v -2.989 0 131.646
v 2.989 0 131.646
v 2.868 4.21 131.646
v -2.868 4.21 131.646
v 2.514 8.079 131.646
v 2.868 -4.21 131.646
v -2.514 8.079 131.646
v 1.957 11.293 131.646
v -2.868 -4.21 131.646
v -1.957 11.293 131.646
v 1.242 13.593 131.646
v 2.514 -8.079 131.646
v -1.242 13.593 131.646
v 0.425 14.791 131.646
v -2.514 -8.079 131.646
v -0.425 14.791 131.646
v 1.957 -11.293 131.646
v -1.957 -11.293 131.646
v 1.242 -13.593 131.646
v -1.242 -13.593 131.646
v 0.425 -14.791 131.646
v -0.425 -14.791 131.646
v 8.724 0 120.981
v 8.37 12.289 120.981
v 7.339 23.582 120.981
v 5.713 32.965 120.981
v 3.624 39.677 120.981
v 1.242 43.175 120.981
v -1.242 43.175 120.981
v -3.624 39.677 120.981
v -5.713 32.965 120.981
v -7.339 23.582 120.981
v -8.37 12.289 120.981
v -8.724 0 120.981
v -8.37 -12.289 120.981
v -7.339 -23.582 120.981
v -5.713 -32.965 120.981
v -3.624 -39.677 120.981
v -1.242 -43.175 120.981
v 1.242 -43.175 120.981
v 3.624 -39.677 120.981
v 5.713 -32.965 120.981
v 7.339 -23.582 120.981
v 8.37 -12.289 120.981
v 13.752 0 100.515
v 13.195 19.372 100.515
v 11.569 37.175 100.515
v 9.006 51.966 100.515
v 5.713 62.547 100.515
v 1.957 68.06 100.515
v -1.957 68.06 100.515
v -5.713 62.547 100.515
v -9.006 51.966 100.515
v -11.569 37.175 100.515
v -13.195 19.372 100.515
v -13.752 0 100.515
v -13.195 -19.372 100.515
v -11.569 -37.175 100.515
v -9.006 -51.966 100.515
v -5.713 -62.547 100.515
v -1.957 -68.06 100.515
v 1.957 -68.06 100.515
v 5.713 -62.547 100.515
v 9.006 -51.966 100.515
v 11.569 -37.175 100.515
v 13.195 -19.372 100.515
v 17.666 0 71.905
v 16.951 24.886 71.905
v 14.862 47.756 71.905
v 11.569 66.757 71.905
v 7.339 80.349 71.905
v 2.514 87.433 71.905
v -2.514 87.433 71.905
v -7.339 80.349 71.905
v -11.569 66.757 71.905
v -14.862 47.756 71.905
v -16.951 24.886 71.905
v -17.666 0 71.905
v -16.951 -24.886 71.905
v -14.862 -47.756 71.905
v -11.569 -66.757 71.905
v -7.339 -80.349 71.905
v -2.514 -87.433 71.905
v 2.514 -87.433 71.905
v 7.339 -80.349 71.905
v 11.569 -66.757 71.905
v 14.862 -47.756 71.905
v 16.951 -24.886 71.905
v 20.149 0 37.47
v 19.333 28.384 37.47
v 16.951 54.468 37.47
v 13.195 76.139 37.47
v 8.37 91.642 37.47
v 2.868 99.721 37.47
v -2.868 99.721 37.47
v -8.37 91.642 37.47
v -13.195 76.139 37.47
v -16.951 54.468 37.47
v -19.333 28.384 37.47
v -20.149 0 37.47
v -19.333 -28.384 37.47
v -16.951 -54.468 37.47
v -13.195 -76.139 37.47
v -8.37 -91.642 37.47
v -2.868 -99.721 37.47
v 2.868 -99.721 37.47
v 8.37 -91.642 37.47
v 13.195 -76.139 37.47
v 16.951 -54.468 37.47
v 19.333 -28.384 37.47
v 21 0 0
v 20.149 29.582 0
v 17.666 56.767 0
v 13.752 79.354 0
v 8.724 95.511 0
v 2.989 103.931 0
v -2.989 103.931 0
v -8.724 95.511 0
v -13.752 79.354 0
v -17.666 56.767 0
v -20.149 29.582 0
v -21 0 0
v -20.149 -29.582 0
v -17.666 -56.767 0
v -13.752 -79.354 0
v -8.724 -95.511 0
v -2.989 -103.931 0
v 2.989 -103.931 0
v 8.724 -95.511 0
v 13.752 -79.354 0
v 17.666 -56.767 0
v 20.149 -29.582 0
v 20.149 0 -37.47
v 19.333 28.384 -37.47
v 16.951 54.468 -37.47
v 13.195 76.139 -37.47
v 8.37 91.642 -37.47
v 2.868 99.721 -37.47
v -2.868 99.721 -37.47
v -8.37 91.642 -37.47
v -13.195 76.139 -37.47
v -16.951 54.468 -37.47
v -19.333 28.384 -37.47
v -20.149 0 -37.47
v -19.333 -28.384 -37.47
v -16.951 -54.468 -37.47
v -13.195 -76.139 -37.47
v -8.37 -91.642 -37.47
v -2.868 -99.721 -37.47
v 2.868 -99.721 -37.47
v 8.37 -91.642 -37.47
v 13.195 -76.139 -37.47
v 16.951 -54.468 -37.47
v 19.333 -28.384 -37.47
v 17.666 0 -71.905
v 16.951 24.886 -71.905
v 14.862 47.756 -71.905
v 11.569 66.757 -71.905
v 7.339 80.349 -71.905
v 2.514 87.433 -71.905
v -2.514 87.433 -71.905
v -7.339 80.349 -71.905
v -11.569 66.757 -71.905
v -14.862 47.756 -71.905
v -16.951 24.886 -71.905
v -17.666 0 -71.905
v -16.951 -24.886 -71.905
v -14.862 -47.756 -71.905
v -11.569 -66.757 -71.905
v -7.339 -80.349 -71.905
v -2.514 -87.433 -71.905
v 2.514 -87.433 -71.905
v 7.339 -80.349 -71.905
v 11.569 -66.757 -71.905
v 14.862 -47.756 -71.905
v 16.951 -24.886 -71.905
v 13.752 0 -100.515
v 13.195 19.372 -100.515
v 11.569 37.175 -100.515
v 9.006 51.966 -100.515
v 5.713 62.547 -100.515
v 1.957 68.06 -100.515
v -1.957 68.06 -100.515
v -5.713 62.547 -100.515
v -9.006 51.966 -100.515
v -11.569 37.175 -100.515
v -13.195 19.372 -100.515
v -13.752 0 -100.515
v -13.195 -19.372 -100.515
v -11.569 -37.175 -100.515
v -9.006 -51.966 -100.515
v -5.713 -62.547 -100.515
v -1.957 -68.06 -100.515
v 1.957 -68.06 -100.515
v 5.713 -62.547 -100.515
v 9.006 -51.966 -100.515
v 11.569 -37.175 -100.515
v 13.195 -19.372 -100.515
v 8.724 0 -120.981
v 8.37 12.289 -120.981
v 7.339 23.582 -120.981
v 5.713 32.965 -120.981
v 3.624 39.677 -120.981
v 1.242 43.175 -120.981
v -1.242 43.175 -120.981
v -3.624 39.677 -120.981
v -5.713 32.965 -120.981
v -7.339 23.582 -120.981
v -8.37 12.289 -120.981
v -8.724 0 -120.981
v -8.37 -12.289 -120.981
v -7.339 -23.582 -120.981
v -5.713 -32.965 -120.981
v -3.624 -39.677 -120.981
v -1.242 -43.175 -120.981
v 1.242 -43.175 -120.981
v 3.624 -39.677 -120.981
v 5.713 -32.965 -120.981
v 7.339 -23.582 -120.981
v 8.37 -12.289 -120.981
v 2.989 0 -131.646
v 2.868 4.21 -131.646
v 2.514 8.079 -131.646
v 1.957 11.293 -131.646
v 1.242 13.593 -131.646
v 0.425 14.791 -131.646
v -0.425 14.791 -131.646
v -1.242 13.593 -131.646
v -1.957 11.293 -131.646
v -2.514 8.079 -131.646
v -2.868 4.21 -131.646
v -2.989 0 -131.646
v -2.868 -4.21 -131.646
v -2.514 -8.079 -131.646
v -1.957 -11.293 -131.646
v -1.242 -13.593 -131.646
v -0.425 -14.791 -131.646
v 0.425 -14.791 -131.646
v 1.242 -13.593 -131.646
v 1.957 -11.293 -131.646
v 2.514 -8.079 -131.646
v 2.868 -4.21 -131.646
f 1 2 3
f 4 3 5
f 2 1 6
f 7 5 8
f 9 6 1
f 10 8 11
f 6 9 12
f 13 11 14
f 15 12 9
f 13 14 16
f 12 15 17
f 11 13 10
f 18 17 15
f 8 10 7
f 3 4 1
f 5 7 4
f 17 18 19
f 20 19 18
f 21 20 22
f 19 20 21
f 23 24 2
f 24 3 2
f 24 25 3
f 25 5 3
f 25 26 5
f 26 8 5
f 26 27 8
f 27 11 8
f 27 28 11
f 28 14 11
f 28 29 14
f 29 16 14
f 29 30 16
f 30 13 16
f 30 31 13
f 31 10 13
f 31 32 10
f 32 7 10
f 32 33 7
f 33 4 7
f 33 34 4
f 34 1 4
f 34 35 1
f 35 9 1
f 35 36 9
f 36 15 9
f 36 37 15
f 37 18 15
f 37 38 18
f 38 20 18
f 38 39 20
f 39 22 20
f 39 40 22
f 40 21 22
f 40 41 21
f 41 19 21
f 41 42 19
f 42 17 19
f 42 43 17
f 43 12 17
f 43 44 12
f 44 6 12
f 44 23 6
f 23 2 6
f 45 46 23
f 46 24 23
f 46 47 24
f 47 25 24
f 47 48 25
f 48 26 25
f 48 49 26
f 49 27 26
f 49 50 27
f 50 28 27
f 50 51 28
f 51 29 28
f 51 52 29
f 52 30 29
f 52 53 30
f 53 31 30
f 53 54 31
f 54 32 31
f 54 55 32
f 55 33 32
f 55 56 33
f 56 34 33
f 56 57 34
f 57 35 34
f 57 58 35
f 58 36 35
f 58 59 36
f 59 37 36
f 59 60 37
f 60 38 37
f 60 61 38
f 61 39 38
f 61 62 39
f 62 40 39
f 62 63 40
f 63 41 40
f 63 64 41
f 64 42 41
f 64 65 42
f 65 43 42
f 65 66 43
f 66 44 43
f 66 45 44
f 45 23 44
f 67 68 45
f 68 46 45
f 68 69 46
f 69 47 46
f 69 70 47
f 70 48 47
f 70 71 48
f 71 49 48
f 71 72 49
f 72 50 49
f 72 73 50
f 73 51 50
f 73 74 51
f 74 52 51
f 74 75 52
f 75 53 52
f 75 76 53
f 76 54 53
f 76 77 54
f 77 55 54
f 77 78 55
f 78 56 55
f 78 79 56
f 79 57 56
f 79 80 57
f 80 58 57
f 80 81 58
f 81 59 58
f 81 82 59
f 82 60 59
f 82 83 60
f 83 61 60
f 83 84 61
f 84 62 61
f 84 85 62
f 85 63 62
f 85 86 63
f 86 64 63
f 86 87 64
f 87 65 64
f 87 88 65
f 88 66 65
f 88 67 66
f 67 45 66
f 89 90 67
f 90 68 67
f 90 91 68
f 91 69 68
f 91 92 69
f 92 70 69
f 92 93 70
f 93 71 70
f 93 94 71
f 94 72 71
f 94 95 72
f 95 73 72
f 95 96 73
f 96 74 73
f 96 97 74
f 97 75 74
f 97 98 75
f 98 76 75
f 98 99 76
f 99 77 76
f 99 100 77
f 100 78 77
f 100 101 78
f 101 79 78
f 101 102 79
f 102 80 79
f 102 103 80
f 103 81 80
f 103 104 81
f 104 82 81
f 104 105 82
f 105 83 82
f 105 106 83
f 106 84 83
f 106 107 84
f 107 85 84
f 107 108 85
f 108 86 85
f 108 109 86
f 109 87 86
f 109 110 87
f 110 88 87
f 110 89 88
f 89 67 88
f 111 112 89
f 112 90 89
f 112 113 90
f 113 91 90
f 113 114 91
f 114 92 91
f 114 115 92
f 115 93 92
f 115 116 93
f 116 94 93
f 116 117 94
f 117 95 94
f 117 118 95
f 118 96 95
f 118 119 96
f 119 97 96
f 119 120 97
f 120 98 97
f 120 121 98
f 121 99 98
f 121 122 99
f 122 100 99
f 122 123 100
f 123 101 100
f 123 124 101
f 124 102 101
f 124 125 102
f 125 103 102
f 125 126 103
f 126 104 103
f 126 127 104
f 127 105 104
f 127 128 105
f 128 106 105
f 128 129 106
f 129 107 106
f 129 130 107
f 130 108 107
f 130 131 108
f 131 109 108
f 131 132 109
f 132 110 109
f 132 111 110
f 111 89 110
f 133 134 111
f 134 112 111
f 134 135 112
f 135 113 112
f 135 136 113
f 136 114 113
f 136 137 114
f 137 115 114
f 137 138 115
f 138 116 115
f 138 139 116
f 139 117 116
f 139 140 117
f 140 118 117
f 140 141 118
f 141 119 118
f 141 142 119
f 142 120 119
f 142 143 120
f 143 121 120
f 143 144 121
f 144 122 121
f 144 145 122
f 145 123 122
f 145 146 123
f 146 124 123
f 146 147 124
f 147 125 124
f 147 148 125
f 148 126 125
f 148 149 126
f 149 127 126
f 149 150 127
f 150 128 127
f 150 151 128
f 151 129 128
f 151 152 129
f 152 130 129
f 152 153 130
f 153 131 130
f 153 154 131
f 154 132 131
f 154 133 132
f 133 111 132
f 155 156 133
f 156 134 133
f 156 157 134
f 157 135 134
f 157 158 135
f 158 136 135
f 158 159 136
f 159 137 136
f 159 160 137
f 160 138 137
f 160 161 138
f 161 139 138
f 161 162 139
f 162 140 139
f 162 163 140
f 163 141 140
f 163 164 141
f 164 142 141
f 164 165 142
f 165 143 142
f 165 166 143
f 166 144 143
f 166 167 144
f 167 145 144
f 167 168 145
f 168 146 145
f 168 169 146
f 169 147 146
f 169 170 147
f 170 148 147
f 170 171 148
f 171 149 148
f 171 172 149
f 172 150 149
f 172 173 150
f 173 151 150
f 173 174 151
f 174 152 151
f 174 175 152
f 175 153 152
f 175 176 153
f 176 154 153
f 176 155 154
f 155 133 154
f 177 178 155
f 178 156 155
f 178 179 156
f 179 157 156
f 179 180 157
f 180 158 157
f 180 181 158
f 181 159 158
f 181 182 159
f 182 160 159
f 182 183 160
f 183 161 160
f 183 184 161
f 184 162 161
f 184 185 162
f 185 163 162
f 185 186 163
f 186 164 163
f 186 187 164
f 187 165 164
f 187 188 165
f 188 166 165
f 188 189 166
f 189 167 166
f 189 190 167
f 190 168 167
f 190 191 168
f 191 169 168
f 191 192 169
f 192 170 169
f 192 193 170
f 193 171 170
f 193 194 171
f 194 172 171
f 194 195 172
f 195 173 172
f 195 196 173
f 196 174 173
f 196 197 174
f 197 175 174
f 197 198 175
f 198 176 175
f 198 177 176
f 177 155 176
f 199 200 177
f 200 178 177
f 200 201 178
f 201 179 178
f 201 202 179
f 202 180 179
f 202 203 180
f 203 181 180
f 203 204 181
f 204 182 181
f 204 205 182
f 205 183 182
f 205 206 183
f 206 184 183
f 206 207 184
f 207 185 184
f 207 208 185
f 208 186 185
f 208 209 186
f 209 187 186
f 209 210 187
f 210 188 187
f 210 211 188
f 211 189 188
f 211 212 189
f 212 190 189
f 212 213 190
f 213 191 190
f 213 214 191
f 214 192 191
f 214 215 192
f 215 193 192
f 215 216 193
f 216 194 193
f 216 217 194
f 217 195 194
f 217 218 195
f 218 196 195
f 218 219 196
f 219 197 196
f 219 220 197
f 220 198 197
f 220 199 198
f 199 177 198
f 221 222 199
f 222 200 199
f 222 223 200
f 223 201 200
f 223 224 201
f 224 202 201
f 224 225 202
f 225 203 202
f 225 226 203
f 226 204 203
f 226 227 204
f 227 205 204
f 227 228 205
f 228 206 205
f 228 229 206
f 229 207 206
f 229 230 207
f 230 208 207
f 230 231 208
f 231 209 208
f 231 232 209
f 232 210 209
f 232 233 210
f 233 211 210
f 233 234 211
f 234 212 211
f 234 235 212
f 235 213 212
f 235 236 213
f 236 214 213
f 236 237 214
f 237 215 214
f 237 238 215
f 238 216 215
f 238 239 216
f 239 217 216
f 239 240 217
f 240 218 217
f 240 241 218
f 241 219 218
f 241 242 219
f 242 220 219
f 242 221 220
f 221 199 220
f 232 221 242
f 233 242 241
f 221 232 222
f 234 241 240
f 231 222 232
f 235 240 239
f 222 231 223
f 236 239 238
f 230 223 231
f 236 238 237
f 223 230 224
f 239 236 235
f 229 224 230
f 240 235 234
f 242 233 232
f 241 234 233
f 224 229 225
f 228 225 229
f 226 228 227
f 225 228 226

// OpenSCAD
// Generated by SolidPython 1.0.1 on 2020-07-29 00:46:45


scale(v = [3, 15, 19]) {
	sphere(r = 7);
}
/***********************************************
*********      SolidPython code:      **********
************************************************
 
# import packages: SolidPython
from solid import *
from solid.utils import *
from itertools import chain, combinations, permutations


class Resize:

    def __init__(self, scad_file):
        self.scad_file = scad_file
        #self.scad_file = import_scad(scad_file)
        # cone/cylinder param:
        self.r1 = 0
        self.r2 = 0
        self.h = 0
        # rectangular prism param:
        self.w = 0
        self.l = 0
        # ellipse param:
        self.r = 0

    # import OpenScad code (file name corresponds to shape)


    # classify shape + parameters
    def assign(self, param1, param2, param3):
        if self.scad_file == 'cone.scad':
            self.r1 = param1
            self.r2 = param2
            self.h = param3
        elif self.scad_file == 'cylinder.scad':
            self.r1 = param1
            self.r2 = param2
            self.h = param3
        elif self.scad_file == 'rectangularPrism.scad':
            self.h = param1
            self.l = param2
            self.w = param3
        else:
            self.r = param1
            self.h = param2

    # resize parameters
    def iterate(self):
        x = range(3, 20, 2)
        i = 1
        if self.scad_file == 'cone.scad':
            tempList = list(permutations(x, 2))
            for temp in tempList:
                param1 = temp[0]
                param2 = temp[1]
                filepath = 'produced_scad_files/' + 'cone' + str(param1) + '_' + str(param2) + '_' + '.scad'
                scad_render_to_file(cylinder(h=param1, r1=param2, r2=0), filepath)

        elif self.scad_file == 'cylinder.scad':
            tempList = list(permutations(x, 3))
            for temp in tempList:
                param1 = temp[0]
                param2 = temp[1]
                filepath = 'produced_scad_files/' + 'cylinder' + str(param1) + '_' + str(param2) + '_' + '.scad'
                scad_render_to_file(cylinder(h=param1, r1=param2, r2=param2), filepath)

        elif self.scad_file == 'rectangularPrism.scad':
            tempList = list(permutations(x, 3))
            for temp in tempList:
                param1 = temp[0]
                param2 = temp[1]
                param3 = temp[2]
                filepath = 'produced_scad_files/' + 'rectangularPrism' + str(param1) + '_' + str(param2) + '_' + str(
                    param3) + '.scad'
                scad_render_to_file(cube(size=(param1, param2, param3)), filepath)

        elif self.scad_file == 'ellipse.scad':
            tempList = list(permutations(x, 4))
            for temp in tempList:
                param1 = temp[0]
                param2 = temp[1]
                param3 = temp[2]
                param4 = temp[3]
                filepath = 'produced_scad_files/' + 'ellipse' + str(param1) + '_' + str(param2) + '_' + str(param3) + '_' + str(param4) + '.scad'
                scad_render_to_file(scale([param1, param2, param3])(sphere(r=param4)), filepath)

    def render_to_scadfile(self):
        scad_render_to_file(scad, 'example.scad') 
 
************************************************/
